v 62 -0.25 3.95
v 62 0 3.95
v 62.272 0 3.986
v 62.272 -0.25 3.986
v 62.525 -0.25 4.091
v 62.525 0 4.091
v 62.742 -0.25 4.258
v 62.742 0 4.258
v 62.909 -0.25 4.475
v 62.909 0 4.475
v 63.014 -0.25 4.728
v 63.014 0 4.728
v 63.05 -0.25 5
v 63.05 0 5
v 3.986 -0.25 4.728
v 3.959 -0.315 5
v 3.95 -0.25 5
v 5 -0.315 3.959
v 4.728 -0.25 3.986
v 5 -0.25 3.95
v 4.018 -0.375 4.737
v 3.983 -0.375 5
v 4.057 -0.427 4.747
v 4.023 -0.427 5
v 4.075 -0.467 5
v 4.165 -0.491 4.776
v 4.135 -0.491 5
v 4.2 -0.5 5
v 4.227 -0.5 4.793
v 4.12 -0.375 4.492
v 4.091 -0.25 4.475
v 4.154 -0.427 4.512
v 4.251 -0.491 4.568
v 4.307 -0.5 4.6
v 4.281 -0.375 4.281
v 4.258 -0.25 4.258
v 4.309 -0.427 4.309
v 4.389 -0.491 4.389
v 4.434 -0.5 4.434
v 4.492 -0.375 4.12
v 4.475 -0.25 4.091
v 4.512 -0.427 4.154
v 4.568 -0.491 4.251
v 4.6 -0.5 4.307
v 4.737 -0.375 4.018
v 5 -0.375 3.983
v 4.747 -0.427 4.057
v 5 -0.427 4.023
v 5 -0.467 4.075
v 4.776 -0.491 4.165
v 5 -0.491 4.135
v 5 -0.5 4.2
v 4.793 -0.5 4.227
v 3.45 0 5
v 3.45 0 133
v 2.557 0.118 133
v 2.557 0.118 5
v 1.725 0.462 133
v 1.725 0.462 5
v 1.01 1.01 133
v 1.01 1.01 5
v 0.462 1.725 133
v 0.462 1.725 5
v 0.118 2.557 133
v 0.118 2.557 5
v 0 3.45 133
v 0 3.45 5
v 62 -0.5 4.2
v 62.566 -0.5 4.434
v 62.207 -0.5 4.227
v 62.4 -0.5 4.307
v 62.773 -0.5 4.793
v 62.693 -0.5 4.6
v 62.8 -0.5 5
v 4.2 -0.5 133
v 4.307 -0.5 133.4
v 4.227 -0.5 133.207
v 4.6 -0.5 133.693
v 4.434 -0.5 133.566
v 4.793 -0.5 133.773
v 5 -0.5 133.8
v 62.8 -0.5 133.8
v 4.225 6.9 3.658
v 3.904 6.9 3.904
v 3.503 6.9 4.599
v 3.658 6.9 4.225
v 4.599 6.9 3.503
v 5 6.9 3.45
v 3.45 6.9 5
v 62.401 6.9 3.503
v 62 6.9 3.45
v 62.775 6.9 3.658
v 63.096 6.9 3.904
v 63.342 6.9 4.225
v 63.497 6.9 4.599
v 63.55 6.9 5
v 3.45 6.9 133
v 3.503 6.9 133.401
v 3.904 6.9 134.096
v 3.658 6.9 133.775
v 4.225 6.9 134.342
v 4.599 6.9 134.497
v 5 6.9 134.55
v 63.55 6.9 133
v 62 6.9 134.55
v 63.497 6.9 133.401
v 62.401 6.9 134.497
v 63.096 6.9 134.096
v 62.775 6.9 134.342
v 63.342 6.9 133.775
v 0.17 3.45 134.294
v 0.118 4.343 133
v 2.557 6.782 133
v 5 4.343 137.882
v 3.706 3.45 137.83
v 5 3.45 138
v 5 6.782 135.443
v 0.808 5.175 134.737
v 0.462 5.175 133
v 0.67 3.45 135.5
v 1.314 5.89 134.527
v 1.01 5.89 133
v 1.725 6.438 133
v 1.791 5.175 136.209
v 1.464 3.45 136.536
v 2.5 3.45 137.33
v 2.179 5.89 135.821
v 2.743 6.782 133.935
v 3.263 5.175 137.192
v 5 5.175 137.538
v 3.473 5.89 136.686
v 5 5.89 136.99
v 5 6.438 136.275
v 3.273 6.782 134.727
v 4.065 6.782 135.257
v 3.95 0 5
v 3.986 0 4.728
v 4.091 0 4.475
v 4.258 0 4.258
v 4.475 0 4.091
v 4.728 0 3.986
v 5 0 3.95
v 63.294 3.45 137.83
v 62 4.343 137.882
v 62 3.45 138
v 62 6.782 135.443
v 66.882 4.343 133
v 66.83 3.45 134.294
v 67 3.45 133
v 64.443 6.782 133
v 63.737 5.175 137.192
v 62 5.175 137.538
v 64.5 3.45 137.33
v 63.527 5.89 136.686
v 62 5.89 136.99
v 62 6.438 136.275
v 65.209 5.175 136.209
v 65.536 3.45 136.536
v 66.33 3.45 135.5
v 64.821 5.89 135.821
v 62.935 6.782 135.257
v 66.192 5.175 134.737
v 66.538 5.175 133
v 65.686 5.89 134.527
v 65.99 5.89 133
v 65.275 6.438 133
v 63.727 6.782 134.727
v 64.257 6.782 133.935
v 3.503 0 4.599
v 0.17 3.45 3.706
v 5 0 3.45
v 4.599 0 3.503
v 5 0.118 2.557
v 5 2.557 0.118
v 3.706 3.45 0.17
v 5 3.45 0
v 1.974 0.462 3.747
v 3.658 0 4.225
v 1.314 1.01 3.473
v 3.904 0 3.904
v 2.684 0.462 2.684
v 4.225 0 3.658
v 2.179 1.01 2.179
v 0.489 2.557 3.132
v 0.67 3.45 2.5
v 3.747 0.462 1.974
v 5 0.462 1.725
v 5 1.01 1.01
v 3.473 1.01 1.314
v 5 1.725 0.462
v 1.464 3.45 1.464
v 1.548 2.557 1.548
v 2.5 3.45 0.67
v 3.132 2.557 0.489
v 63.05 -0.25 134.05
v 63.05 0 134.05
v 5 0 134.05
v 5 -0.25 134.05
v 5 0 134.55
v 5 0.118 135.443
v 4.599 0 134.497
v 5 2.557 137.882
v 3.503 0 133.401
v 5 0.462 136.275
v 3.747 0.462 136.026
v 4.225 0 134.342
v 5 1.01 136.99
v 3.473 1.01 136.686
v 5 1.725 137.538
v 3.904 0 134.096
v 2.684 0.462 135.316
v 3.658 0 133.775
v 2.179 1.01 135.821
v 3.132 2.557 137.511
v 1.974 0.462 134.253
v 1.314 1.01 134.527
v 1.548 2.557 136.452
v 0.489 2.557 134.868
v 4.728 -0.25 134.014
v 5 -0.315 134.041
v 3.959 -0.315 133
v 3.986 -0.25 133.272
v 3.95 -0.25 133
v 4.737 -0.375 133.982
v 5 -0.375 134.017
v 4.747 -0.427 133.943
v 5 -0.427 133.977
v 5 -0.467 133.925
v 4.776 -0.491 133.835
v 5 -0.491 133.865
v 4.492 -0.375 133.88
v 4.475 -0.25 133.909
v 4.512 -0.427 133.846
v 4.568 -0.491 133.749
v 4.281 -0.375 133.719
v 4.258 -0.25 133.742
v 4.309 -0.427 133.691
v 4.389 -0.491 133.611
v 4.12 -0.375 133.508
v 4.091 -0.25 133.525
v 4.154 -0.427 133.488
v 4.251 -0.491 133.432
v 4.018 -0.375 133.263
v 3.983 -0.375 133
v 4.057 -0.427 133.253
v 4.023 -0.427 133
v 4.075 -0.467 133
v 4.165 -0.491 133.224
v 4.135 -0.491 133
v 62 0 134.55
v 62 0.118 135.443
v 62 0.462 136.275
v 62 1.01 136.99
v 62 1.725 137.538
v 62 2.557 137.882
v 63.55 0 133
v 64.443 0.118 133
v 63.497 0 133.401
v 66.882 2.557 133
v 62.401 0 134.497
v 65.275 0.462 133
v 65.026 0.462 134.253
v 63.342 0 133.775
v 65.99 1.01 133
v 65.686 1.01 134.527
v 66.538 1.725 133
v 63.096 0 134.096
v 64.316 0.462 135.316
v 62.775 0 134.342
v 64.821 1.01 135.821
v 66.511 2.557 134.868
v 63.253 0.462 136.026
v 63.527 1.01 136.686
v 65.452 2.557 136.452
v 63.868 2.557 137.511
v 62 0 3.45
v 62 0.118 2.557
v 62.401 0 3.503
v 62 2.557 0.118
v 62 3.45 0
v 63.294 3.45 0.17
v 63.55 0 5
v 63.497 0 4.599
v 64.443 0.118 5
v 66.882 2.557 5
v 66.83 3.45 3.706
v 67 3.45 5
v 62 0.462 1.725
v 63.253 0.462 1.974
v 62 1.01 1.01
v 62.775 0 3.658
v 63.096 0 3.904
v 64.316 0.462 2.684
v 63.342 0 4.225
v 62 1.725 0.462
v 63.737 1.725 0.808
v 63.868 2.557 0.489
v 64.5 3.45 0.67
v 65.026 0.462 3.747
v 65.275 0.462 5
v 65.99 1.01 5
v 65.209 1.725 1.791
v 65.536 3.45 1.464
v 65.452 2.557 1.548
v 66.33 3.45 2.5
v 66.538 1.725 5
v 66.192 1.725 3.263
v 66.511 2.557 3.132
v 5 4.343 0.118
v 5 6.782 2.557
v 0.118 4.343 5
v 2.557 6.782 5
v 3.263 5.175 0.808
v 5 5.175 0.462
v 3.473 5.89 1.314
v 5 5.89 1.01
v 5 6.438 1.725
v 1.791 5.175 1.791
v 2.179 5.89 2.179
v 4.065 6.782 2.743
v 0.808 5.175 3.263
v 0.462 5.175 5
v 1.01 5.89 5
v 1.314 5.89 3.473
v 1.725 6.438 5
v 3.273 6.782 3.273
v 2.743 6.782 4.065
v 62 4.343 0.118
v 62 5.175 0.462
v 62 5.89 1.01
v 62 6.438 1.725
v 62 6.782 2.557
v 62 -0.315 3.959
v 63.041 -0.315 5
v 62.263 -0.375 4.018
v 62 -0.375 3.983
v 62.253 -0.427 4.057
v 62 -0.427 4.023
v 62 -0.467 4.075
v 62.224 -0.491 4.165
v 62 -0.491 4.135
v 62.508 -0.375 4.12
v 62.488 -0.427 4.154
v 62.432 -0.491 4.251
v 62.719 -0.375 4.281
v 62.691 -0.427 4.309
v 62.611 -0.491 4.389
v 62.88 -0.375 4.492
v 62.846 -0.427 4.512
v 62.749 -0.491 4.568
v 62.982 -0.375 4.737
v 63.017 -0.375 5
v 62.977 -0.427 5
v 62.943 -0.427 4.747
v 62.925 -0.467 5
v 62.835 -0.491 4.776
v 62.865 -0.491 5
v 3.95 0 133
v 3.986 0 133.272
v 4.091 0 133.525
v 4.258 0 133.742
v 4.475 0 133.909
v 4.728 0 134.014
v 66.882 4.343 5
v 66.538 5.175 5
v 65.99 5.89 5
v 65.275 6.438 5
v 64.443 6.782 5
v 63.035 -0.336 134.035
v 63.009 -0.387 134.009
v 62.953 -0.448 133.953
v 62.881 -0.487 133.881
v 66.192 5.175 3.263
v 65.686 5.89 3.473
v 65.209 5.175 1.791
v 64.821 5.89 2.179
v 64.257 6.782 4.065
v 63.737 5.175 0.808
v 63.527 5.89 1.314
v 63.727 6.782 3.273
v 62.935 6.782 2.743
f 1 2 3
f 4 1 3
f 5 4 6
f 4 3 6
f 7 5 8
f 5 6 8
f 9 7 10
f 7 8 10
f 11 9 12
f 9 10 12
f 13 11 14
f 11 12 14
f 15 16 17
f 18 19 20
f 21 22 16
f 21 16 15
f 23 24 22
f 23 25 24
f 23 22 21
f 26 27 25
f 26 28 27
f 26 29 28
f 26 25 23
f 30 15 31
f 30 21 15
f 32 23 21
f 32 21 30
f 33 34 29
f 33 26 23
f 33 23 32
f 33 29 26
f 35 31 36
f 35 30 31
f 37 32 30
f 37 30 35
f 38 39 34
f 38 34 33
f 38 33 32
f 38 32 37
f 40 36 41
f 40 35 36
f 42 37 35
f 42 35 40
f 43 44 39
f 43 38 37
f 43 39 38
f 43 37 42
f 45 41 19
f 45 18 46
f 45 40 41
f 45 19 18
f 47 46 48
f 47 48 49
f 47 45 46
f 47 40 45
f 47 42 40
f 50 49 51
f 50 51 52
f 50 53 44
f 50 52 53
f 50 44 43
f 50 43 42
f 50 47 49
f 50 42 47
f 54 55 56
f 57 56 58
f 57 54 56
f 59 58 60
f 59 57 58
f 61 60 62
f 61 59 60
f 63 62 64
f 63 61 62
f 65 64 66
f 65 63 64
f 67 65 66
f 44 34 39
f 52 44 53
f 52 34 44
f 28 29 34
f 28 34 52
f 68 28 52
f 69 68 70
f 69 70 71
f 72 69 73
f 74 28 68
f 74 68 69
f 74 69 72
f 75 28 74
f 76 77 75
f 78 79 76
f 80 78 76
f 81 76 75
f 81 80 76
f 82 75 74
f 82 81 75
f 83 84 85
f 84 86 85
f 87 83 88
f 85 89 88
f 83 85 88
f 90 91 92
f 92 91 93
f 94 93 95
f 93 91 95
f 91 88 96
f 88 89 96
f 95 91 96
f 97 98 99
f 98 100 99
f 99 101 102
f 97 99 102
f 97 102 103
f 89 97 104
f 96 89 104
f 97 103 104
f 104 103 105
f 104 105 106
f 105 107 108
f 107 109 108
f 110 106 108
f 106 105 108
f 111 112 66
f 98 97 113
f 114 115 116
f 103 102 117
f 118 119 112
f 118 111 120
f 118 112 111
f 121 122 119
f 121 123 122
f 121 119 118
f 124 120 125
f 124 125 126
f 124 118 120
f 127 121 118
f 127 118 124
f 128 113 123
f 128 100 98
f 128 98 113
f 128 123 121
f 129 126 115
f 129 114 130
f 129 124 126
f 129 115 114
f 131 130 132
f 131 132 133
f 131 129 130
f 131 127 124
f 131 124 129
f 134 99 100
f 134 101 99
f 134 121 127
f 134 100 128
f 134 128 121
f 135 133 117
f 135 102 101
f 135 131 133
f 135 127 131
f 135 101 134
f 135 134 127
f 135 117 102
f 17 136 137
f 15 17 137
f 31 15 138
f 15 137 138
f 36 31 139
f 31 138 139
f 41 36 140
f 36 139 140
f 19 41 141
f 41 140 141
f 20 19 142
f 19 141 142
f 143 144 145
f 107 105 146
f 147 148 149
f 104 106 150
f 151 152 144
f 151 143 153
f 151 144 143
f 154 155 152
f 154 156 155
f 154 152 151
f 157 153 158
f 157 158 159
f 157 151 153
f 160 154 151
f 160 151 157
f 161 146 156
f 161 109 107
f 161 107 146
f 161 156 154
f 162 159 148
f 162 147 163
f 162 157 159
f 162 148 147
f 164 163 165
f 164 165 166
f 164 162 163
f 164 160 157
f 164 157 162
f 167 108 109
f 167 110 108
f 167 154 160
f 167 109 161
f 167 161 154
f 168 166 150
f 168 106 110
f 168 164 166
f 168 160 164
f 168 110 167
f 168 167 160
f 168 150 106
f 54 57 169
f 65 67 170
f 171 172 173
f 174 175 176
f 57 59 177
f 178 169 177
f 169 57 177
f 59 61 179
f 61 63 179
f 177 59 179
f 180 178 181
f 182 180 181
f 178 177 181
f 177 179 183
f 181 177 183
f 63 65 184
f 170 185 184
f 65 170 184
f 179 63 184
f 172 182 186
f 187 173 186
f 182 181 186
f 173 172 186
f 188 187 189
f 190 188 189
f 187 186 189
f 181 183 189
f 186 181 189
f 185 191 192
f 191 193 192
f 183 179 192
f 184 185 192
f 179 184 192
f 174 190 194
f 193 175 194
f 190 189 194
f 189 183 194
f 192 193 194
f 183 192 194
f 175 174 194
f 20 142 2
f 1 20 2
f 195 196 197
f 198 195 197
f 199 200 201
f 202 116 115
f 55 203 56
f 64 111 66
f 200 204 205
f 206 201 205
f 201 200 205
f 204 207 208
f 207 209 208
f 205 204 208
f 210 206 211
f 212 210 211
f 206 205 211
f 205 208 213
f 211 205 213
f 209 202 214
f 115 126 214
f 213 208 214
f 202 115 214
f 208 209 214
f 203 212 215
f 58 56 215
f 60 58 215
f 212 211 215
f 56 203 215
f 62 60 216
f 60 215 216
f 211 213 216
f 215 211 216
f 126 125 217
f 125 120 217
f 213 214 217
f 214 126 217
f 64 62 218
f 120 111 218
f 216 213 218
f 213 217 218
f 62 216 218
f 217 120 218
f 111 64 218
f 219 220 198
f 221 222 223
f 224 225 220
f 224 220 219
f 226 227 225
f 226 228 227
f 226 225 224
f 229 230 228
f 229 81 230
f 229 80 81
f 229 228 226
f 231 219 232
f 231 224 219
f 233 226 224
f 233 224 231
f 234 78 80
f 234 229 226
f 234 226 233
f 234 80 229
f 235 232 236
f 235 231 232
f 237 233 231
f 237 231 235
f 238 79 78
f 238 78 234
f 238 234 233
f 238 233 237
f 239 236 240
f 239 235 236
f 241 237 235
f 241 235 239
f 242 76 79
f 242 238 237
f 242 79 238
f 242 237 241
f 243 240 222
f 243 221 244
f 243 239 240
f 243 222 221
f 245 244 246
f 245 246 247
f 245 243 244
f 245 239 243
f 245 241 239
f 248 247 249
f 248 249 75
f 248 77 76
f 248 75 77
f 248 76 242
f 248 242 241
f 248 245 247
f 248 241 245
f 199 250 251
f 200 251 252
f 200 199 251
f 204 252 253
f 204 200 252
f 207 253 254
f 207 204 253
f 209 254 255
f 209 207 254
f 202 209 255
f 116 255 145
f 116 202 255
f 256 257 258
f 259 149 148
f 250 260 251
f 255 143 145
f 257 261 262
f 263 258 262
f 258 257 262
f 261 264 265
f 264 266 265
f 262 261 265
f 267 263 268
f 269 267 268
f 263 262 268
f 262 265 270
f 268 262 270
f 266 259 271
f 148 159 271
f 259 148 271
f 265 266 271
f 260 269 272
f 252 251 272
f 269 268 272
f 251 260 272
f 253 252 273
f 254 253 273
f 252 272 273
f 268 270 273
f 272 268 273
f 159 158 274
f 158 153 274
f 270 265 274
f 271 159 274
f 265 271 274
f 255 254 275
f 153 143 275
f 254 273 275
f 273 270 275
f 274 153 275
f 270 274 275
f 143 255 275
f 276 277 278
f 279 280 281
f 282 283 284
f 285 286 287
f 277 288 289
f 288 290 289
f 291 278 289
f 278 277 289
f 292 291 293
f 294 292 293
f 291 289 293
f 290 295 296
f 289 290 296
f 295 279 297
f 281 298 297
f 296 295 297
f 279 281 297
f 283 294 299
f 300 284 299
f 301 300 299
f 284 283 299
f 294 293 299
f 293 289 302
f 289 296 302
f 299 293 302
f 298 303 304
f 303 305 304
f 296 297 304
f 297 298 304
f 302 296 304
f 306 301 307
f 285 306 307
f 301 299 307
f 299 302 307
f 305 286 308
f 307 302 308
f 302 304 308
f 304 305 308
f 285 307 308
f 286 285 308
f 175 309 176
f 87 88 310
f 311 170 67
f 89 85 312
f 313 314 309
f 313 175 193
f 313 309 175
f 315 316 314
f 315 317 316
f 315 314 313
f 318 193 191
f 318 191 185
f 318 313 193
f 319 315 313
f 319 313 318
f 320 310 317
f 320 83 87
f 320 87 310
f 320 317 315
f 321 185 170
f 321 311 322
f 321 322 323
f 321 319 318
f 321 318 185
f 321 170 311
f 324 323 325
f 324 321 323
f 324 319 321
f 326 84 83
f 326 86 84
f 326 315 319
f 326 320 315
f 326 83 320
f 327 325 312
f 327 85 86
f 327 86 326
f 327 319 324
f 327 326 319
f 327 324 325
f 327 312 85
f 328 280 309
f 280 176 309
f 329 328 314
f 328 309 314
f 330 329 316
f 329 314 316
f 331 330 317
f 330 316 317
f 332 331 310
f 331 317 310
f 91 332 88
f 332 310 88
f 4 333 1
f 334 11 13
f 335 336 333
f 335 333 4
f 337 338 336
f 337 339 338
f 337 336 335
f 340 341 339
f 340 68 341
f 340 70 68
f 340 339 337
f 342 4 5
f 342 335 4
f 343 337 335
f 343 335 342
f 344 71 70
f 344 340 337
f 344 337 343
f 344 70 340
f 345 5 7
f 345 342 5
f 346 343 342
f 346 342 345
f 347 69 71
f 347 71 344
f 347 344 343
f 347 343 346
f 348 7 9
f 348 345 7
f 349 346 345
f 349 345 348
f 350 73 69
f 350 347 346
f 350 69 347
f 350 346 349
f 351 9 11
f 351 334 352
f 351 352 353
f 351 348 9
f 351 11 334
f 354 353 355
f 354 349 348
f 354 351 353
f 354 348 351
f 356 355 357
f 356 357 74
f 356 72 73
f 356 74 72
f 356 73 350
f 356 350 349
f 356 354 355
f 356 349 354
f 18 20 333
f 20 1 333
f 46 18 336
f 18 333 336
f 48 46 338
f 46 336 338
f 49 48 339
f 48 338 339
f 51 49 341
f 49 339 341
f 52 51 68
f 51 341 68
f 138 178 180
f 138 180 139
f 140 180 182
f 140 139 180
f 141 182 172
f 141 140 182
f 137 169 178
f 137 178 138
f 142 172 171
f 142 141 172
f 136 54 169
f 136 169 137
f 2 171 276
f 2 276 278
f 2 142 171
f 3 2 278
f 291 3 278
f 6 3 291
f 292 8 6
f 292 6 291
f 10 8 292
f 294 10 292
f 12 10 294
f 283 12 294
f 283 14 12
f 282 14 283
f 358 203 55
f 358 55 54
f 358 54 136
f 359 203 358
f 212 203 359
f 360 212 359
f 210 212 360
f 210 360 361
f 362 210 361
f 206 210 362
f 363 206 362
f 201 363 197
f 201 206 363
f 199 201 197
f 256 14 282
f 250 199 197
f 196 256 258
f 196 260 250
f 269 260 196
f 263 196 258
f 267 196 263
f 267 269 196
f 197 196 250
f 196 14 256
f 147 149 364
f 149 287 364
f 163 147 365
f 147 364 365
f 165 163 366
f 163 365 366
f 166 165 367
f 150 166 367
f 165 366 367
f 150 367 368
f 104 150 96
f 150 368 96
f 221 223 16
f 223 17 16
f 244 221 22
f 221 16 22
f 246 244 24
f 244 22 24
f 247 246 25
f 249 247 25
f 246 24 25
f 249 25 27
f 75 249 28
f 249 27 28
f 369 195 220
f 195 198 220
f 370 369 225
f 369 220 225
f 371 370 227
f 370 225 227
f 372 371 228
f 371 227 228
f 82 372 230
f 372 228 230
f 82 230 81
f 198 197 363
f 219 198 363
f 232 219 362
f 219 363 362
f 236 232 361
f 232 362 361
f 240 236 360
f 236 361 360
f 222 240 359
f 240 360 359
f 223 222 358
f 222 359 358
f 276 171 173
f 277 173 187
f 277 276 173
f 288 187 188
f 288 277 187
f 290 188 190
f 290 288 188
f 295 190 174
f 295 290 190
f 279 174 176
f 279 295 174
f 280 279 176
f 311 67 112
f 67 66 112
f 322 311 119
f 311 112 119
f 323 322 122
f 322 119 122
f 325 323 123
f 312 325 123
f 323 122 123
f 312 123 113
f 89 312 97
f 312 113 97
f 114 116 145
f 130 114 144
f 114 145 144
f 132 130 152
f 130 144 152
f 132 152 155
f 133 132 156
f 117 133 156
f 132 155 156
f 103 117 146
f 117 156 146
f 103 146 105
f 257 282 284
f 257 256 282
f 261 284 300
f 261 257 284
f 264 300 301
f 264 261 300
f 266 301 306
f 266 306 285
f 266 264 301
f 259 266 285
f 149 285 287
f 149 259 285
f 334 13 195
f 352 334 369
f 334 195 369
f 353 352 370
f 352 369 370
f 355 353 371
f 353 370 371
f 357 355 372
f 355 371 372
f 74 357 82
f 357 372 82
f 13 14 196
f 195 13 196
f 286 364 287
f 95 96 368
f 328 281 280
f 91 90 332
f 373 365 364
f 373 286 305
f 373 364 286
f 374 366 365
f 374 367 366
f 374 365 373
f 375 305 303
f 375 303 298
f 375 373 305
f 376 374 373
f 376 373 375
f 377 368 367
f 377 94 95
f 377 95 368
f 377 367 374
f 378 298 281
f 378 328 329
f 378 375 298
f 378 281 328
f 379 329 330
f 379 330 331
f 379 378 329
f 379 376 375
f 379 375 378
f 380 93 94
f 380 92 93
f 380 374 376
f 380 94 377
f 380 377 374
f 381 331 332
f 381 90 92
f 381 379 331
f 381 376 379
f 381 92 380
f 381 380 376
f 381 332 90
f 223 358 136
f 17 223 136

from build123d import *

# Parameters (mm, degrees)
F0_W     = 67
F0_H     = 138
F1_DEPTH = 6.9
F2_R     = 5
F3_R     = 3.44999
F6_DEPTH = 0.5
F7_R     = 0.25


# Not quite as in the source:
# - a fillet or chamfer is up to 0.001 mm smaller than in the source, because OpenCascade refuses the exact size


with BuildPart() as f1:
    # F0 (on Front) → F1 (new body)
    with BuildSketch(Plane.XZ):
        with Locations((33.5, 69)):
            Rectangle(F0_W, F0_H)
    extrude(amount=-F1_DEPTH)

    # F2
    f2_edges = [f1.edges().sort_by_distance(p)[0] for p in [
        (67, 3.45, 138),
        (67, 3.45, 0),
        (0, 3.45, 138),
        (0, 3.45, 0),
    ]]
    fillet(f2_edges, radius=F2_R)

    # F3 (radius 3.45 in the source; OpenCascade refuses exactly that, so slightly less here)
    f3_edges = [f1.edges().sort_by_distance(p)[0] for p in [
        (67, 0, 69),
        (0, 6.9, 69),
        (1.464466, 6.9, 136.535534),
        (1.464466, 6.9, 1.464466),
        (33.5, 6.9, 138),
        (33.5, 6.9, 0),
        (65.535534, 6.9, 136.535534),
        (65.535534, 6.9, 1.464466),
        (67, 6.9, 69),
    ]]
    fillet(f3_edges, radius=F3_R)

    # F5 (on face) → F6 (join)
    with BuildSketch(Plane.XZ):
        with BuildLine():
            ThreePointArc((5, 134.05), (4.2575378798, 133.7424621202), (3.95, 133))
            Line((3.95, 133), (3.95, 5))
            ThreePointArc((3.95, 5), (4.2575378798, 4.2575378798), (5, 3.95))
            Line((5, 3.95), (62, 3.95))
            ThreePointArc((62, 3.95), (62.7424621202, 4.2575378798), (63.05, 5))
            Line((63.05, 5), (63.05, 134.05))
            Line((63.05, 134.05), (5, 134.05))
        make_face()
    extrude(amount=F6_DEPTH)

    # F7
    f7_edges = [f1.edges().sort_by_distance(p)[0] for p in [
        (3.95, -0.5, 69),
    ]]
    fillet(f7_edges, radius=F7_R)


solid = f1.part
